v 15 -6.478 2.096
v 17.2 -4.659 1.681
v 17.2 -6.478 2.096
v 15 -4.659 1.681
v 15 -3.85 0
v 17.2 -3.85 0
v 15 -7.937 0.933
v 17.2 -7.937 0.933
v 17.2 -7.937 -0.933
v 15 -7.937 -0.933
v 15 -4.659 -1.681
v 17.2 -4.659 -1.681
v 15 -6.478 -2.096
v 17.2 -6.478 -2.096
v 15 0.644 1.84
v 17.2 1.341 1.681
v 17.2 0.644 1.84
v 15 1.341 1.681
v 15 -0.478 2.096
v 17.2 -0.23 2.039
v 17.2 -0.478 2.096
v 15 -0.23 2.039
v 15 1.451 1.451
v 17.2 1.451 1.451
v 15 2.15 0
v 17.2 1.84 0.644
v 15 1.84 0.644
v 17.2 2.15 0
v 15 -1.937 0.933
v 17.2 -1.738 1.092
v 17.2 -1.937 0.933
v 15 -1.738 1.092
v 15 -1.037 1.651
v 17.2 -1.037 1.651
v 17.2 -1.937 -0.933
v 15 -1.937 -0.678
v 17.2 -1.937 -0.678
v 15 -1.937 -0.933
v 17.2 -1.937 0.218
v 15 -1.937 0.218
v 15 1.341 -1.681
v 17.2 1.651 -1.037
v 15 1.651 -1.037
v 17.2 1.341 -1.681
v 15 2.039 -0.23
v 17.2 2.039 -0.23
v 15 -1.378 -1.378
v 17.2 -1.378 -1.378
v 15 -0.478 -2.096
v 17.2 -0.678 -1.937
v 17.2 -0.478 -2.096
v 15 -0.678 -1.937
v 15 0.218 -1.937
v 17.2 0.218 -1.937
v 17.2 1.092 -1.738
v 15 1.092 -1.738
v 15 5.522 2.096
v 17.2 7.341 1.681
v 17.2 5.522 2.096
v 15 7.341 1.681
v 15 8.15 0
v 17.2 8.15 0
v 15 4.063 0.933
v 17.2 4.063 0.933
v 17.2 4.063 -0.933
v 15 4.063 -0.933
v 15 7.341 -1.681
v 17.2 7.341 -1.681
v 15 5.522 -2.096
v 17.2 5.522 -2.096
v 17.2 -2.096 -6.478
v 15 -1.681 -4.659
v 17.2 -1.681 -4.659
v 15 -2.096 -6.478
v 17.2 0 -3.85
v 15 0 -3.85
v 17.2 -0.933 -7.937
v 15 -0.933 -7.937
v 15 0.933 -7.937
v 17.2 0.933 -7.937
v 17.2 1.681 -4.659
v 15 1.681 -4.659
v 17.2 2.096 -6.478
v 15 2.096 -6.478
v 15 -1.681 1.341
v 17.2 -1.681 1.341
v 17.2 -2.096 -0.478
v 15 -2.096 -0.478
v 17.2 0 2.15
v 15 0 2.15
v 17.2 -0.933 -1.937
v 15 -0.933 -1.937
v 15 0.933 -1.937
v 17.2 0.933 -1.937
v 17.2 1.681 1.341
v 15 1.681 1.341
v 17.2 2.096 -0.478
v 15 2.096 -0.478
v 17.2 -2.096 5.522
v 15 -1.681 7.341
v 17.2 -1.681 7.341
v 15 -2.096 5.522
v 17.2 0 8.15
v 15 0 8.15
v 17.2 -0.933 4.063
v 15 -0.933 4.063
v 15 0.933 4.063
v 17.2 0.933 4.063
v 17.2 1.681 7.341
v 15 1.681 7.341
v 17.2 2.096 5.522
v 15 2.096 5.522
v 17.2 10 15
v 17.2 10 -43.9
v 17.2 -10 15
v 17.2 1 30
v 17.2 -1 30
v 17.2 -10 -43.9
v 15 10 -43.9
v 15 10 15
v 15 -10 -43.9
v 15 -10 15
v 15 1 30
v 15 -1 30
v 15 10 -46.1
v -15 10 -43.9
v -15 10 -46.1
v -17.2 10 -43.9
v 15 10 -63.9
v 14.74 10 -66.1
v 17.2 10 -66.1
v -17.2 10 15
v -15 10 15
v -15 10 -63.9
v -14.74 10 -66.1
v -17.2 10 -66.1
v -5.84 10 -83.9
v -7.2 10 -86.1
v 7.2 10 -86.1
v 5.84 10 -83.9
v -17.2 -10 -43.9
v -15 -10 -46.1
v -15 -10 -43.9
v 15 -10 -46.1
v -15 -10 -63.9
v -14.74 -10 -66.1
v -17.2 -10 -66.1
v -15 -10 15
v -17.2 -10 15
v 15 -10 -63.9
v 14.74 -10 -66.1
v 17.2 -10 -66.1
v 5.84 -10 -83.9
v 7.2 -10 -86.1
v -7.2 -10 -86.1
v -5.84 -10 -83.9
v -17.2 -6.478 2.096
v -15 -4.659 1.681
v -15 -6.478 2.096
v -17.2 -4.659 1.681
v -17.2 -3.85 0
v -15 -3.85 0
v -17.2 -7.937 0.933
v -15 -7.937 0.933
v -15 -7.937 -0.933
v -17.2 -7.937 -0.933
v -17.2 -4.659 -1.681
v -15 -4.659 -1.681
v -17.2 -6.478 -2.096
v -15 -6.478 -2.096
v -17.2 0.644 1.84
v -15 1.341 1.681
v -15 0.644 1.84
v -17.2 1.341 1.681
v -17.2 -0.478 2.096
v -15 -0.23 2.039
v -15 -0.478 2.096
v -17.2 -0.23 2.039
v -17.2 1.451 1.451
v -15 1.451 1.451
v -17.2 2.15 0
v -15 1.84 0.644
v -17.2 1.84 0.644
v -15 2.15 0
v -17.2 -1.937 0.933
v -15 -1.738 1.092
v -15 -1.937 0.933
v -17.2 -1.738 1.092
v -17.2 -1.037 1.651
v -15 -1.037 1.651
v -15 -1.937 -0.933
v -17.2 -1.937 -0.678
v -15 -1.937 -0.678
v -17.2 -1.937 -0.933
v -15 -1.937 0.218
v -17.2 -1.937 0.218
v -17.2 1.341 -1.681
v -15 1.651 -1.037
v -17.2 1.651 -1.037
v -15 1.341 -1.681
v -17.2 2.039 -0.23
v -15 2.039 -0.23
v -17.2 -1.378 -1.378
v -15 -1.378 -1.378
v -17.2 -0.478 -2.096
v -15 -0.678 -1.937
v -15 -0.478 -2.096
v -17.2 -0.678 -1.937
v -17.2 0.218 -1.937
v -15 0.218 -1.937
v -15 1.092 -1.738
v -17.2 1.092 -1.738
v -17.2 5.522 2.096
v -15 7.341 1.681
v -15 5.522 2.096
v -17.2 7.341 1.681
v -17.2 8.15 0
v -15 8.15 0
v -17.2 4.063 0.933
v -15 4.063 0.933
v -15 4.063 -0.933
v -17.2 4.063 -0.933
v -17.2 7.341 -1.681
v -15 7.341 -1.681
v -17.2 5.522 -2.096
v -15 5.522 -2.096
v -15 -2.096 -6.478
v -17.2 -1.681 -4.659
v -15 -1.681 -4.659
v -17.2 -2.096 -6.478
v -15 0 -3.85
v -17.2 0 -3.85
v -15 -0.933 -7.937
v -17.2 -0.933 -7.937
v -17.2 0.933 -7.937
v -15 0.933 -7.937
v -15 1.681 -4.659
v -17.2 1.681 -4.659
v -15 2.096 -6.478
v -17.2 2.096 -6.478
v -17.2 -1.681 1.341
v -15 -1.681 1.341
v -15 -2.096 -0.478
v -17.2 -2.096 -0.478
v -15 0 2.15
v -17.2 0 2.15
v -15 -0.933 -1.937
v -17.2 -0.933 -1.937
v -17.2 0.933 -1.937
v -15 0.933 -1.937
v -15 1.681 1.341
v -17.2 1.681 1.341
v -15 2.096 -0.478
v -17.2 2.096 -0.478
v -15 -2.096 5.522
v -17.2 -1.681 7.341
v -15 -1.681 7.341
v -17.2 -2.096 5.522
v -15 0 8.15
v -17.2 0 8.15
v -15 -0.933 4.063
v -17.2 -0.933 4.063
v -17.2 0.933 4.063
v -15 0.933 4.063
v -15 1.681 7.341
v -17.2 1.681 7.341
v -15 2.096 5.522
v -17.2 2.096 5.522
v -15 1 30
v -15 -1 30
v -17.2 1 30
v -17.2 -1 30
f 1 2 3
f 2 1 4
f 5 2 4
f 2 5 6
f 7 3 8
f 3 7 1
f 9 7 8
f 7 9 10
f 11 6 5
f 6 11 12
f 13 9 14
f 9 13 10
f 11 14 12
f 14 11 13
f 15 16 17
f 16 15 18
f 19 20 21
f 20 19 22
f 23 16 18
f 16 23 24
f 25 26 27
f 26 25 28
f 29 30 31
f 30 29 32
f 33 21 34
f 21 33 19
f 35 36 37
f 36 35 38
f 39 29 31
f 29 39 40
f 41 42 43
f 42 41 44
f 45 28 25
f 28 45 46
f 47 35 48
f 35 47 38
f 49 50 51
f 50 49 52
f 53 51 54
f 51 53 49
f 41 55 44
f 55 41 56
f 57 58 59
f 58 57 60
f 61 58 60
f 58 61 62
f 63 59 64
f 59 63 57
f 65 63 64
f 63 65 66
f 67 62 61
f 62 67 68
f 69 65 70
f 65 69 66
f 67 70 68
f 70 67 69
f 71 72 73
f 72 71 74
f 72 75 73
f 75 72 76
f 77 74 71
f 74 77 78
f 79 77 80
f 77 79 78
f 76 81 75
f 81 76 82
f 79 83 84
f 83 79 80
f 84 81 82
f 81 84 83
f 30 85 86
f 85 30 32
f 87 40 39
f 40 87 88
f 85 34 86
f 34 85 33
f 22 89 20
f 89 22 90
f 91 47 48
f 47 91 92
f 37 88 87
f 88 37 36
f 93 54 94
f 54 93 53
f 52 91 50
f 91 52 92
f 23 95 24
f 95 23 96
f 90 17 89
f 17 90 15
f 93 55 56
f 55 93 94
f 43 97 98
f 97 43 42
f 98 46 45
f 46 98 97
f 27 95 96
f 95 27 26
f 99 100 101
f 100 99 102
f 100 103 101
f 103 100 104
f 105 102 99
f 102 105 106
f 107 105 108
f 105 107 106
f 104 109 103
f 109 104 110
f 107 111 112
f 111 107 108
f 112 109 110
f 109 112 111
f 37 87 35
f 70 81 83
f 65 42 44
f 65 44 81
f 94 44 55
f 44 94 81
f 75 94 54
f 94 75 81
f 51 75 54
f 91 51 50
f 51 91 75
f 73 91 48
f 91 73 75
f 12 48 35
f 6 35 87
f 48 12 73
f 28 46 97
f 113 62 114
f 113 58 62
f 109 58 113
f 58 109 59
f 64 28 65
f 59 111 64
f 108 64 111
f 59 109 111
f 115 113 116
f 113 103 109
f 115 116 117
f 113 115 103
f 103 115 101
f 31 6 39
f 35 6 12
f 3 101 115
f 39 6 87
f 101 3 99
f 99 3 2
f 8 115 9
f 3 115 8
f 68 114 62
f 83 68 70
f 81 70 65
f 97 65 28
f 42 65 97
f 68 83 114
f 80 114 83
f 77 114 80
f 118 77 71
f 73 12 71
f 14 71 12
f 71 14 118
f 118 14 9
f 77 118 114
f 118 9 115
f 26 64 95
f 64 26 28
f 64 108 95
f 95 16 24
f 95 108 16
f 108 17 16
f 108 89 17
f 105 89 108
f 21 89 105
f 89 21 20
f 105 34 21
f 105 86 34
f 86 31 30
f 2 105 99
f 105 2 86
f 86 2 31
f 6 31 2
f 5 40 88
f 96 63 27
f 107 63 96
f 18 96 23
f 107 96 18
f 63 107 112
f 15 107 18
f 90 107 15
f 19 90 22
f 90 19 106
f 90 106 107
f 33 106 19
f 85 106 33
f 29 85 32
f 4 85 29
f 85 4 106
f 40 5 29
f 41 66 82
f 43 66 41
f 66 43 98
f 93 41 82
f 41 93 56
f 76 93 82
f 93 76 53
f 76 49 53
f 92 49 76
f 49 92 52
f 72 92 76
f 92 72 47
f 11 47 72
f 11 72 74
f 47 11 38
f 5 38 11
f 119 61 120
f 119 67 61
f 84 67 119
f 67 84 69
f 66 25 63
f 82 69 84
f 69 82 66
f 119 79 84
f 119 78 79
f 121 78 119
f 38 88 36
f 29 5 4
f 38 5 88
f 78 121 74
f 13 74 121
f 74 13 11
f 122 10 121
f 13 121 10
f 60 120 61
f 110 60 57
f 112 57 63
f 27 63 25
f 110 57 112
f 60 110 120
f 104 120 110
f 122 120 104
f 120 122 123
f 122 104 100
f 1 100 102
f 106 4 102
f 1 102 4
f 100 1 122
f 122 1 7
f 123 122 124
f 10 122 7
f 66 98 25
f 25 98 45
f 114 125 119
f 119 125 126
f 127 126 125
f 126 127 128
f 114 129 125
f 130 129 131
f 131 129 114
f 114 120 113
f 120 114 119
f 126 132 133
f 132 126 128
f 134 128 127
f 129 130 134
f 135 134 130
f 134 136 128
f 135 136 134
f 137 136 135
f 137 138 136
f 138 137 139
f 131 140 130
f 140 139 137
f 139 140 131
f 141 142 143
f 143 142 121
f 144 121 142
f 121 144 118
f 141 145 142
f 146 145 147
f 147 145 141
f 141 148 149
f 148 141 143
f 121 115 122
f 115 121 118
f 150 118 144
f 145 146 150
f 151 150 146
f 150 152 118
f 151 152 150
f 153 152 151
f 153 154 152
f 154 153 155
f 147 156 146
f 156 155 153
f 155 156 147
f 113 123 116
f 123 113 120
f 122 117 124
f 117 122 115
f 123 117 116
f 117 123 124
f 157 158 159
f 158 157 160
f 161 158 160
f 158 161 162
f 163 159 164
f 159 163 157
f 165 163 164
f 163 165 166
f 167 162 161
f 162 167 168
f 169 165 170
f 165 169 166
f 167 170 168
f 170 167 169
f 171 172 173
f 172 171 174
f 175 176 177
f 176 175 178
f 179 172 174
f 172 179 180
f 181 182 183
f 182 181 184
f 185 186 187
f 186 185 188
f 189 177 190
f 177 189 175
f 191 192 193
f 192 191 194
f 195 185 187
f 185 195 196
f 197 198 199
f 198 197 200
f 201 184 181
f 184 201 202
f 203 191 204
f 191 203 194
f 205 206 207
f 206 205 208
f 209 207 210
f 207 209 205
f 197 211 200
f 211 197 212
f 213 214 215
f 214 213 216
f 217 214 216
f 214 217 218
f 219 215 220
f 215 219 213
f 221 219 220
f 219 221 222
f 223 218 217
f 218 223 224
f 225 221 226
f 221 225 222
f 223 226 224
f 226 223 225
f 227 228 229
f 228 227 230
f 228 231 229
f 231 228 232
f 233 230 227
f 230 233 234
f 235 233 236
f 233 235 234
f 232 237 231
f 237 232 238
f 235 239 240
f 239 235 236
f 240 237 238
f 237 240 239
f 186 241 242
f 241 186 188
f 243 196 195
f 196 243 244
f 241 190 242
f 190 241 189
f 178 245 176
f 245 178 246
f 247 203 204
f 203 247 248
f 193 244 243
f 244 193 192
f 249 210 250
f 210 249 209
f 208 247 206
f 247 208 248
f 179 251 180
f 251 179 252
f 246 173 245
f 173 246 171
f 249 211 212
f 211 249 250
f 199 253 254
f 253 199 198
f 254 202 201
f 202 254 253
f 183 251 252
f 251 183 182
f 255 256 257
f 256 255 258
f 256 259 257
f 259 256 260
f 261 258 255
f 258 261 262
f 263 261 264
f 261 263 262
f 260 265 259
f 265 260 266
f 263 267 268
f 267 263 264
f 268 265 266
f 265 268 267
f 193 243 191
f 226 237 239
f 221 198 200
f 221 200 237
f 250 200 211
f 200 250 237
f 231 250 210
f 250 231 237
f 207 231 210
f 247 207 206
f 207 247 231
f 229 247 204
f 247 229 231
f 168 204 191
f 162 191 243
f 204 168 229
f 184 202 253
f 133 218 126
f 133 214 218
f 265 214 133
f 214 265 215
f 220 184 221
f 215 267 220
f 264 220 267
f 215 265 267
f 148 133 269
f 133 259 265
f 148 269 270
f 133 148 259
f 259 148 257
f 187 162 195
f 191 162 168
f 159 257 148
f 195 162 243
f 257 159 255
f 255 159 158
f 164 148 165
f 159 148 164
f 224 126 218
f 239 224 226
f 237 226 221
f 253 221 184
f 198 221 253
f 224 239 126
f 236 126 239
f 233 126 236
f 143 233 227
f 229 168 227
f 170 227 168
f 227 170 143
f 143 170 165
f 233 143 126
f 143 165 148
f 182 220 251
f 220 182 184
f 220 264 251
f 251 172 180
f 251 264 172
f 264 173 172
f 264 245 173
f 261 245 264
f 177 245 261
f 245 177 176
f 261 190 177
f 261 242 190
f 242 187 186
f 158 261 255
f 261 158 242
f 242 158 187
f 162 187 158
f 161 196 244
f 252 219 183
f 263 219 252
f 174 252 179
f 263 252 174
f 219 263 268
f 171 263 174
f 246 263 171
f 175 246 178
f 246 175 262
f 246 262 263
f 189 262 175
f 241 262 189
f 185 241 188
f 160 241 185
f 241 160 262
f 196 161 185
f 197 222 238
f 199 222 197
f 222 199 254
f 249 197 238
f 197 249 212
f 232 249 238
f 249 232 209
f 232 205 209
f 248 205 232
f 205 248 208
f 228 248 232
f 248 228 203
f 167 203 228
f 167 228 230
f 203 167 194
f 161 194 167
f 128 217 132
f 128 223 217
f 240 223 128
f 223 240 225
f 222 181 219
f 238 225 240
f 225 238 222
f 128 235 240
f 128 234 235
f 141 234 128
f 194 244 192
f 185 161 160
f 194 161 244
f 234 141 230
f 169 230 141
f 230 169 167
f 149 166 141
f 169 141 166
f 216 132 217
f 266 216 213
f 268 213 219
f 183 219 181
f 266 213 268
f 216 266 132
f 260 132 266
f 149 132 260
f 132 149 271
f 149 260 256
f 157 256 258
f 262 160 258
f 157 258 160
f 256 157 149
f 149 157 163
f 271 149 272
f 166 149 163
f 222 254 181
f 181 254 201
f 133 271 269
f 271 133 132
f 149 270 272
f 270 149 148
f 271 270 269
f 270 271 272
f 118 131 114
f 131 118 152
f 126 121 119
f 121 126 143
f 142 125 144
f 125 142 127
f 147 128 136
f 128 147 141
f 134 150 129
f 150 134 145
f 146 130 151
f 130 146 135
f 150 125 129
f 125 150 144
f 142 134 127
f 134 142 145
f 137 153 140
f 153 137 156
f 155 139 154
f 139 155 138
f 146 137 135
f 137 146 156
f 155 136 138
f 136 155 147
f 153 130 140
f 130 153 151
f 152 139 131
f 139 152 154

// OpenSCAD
// file: ../util/rounded.scad
// Do a rounded cube
module rounded(x=10, y=10, z=10, r=3, center=false) {
  if (center) {
    translate([-(x/2),-(y/2),0])
      rounded(x, y, z, r);
  } else {
    translate([r,r,0])
    minkowski() {
      cube([x-2*r,y-2*r,z/2]);
      cylinder(h=z/2, r=r);
    }
  }
}
// file: ../models/ollo.scad
// Diameter of plastic ollo holes
OlloHoles = 4.3;

// Width of Ollo "real" plastic
OlloWidth = 3;

// Distance between two ollo holes
OlloSpacing = 6;

// Do an Ollo hole on the part
module olloHole(depth=2.2)
{
    translate([0,0,-0.1])
      cylinder(depth+0.2, OlloHoles/2, OlloHoles/2);
}

// Do 3 ollo holes
module threeOllo(depth=2.2)
{
  for (xy=[[-OlloSpacing,0],[0,0],[OlloSpacing,0]]) {
    translate([xy[0], xy[1], 0])
    olloHole(depth);
  }
}

// Do a servo arm holes
module servoArm(depth=2.2)
{
    threeOllo(depth);
    rotate([0,0,90])
      threeOllo(depth);
}
// main file
use <../models/ollo.scad>;
use <../util/rounded.scad>;

module leg(sizeA=60, sizeB=20, sizeC=20, sizeBottom=10,
        sizeTop=15, motorsPerLeg=3, fixationAngle=0, width=2.2, print=false)
{
    xOffset = (motorsPerLeg == 2) ? -10 : 0;
    spacing = (motorsPerLeg == 2) ? 24 : 30;

    module legSide()
    {
        difference() {
            union() {
                translate([0,0,sizeA/2])
                    rotate([0,90,0]) {
                        cube([sizeA, 20, width], center=true);
                        if (motorsPerLeg == 2) {
                            translate([15-sizeA/2, 10, -width/2])
                                rotate([0,0,+fixationAngle])
                                rounded(25,10,width, center=true);
                        }
                    }
            }
            translate([-width, 0, sizeA-15]) {
                rotate([90,0,90]) {
                    if (motorsPerLeg == 3) {
                        servoArm(2*width);
                    }
                }
                if (motorsPerLeg == 2) {
                    translate([0,10,0])
                        rotate([90,90-fixationAngle,90])
                        threeOllo(2*width);
                }
            }
        }
        translate([-width/2,0,sizeA]) {
            rotate([90,0,90])
                linear_extrude(width)
                polygon([[-10,0],[-1,sizeTop],[1,sizeTop],[10,0]]);
        }
    }

    module biais() {
        Dx = (spacing-sizeBottom)/2;
        Dy = sizeC;
        Dl = sqrt(pow(Dx,2)+pow(Dy,2));

        translate([-(spacing/2)-width,-10,-(sizeB+width/2)])
            rotate([0,atan2(Dy,Dx),0])
            cube([Dl,20,width]);
    }

    if (print) {
        translate([0,0,10-xOffset])
            rotate([90,0,0])
            leg(sizeA, sizeB, sizeC, sizeBottom,
                    sizeTop, motorsPerLeg, fixationAngle, width, false);
    } else {
        echo("[PART] leg");
        translate([0,xOffset,-sizeA+15]) {
            cube([spacing+width*2, 20, width], center=true);

            translate([spacing/2+width/2,0,0])
                legSide();
            translate([-(spacing/2+width/2),0,0])
                legSide();

            translate([0,0,-sizeB])
                cube([spacing+width*2, 20, width], center=true);
            translate([spacing/2+width/2,0,-sizeB/2])
                cube([width,20,sizeB], center=true);
            translate([-(spacing/2+width/2),0,-sizeB/2])
                cube([width,20,sizeB], center=true);

            translate([0,0,-(sizeB+sizeC)])
                cube([sizeBottom+width*2, 20, width], center=true);

            biais();
            mirror([1,0,0]) {
                biais();
            }
        }
    }
}

leg();
